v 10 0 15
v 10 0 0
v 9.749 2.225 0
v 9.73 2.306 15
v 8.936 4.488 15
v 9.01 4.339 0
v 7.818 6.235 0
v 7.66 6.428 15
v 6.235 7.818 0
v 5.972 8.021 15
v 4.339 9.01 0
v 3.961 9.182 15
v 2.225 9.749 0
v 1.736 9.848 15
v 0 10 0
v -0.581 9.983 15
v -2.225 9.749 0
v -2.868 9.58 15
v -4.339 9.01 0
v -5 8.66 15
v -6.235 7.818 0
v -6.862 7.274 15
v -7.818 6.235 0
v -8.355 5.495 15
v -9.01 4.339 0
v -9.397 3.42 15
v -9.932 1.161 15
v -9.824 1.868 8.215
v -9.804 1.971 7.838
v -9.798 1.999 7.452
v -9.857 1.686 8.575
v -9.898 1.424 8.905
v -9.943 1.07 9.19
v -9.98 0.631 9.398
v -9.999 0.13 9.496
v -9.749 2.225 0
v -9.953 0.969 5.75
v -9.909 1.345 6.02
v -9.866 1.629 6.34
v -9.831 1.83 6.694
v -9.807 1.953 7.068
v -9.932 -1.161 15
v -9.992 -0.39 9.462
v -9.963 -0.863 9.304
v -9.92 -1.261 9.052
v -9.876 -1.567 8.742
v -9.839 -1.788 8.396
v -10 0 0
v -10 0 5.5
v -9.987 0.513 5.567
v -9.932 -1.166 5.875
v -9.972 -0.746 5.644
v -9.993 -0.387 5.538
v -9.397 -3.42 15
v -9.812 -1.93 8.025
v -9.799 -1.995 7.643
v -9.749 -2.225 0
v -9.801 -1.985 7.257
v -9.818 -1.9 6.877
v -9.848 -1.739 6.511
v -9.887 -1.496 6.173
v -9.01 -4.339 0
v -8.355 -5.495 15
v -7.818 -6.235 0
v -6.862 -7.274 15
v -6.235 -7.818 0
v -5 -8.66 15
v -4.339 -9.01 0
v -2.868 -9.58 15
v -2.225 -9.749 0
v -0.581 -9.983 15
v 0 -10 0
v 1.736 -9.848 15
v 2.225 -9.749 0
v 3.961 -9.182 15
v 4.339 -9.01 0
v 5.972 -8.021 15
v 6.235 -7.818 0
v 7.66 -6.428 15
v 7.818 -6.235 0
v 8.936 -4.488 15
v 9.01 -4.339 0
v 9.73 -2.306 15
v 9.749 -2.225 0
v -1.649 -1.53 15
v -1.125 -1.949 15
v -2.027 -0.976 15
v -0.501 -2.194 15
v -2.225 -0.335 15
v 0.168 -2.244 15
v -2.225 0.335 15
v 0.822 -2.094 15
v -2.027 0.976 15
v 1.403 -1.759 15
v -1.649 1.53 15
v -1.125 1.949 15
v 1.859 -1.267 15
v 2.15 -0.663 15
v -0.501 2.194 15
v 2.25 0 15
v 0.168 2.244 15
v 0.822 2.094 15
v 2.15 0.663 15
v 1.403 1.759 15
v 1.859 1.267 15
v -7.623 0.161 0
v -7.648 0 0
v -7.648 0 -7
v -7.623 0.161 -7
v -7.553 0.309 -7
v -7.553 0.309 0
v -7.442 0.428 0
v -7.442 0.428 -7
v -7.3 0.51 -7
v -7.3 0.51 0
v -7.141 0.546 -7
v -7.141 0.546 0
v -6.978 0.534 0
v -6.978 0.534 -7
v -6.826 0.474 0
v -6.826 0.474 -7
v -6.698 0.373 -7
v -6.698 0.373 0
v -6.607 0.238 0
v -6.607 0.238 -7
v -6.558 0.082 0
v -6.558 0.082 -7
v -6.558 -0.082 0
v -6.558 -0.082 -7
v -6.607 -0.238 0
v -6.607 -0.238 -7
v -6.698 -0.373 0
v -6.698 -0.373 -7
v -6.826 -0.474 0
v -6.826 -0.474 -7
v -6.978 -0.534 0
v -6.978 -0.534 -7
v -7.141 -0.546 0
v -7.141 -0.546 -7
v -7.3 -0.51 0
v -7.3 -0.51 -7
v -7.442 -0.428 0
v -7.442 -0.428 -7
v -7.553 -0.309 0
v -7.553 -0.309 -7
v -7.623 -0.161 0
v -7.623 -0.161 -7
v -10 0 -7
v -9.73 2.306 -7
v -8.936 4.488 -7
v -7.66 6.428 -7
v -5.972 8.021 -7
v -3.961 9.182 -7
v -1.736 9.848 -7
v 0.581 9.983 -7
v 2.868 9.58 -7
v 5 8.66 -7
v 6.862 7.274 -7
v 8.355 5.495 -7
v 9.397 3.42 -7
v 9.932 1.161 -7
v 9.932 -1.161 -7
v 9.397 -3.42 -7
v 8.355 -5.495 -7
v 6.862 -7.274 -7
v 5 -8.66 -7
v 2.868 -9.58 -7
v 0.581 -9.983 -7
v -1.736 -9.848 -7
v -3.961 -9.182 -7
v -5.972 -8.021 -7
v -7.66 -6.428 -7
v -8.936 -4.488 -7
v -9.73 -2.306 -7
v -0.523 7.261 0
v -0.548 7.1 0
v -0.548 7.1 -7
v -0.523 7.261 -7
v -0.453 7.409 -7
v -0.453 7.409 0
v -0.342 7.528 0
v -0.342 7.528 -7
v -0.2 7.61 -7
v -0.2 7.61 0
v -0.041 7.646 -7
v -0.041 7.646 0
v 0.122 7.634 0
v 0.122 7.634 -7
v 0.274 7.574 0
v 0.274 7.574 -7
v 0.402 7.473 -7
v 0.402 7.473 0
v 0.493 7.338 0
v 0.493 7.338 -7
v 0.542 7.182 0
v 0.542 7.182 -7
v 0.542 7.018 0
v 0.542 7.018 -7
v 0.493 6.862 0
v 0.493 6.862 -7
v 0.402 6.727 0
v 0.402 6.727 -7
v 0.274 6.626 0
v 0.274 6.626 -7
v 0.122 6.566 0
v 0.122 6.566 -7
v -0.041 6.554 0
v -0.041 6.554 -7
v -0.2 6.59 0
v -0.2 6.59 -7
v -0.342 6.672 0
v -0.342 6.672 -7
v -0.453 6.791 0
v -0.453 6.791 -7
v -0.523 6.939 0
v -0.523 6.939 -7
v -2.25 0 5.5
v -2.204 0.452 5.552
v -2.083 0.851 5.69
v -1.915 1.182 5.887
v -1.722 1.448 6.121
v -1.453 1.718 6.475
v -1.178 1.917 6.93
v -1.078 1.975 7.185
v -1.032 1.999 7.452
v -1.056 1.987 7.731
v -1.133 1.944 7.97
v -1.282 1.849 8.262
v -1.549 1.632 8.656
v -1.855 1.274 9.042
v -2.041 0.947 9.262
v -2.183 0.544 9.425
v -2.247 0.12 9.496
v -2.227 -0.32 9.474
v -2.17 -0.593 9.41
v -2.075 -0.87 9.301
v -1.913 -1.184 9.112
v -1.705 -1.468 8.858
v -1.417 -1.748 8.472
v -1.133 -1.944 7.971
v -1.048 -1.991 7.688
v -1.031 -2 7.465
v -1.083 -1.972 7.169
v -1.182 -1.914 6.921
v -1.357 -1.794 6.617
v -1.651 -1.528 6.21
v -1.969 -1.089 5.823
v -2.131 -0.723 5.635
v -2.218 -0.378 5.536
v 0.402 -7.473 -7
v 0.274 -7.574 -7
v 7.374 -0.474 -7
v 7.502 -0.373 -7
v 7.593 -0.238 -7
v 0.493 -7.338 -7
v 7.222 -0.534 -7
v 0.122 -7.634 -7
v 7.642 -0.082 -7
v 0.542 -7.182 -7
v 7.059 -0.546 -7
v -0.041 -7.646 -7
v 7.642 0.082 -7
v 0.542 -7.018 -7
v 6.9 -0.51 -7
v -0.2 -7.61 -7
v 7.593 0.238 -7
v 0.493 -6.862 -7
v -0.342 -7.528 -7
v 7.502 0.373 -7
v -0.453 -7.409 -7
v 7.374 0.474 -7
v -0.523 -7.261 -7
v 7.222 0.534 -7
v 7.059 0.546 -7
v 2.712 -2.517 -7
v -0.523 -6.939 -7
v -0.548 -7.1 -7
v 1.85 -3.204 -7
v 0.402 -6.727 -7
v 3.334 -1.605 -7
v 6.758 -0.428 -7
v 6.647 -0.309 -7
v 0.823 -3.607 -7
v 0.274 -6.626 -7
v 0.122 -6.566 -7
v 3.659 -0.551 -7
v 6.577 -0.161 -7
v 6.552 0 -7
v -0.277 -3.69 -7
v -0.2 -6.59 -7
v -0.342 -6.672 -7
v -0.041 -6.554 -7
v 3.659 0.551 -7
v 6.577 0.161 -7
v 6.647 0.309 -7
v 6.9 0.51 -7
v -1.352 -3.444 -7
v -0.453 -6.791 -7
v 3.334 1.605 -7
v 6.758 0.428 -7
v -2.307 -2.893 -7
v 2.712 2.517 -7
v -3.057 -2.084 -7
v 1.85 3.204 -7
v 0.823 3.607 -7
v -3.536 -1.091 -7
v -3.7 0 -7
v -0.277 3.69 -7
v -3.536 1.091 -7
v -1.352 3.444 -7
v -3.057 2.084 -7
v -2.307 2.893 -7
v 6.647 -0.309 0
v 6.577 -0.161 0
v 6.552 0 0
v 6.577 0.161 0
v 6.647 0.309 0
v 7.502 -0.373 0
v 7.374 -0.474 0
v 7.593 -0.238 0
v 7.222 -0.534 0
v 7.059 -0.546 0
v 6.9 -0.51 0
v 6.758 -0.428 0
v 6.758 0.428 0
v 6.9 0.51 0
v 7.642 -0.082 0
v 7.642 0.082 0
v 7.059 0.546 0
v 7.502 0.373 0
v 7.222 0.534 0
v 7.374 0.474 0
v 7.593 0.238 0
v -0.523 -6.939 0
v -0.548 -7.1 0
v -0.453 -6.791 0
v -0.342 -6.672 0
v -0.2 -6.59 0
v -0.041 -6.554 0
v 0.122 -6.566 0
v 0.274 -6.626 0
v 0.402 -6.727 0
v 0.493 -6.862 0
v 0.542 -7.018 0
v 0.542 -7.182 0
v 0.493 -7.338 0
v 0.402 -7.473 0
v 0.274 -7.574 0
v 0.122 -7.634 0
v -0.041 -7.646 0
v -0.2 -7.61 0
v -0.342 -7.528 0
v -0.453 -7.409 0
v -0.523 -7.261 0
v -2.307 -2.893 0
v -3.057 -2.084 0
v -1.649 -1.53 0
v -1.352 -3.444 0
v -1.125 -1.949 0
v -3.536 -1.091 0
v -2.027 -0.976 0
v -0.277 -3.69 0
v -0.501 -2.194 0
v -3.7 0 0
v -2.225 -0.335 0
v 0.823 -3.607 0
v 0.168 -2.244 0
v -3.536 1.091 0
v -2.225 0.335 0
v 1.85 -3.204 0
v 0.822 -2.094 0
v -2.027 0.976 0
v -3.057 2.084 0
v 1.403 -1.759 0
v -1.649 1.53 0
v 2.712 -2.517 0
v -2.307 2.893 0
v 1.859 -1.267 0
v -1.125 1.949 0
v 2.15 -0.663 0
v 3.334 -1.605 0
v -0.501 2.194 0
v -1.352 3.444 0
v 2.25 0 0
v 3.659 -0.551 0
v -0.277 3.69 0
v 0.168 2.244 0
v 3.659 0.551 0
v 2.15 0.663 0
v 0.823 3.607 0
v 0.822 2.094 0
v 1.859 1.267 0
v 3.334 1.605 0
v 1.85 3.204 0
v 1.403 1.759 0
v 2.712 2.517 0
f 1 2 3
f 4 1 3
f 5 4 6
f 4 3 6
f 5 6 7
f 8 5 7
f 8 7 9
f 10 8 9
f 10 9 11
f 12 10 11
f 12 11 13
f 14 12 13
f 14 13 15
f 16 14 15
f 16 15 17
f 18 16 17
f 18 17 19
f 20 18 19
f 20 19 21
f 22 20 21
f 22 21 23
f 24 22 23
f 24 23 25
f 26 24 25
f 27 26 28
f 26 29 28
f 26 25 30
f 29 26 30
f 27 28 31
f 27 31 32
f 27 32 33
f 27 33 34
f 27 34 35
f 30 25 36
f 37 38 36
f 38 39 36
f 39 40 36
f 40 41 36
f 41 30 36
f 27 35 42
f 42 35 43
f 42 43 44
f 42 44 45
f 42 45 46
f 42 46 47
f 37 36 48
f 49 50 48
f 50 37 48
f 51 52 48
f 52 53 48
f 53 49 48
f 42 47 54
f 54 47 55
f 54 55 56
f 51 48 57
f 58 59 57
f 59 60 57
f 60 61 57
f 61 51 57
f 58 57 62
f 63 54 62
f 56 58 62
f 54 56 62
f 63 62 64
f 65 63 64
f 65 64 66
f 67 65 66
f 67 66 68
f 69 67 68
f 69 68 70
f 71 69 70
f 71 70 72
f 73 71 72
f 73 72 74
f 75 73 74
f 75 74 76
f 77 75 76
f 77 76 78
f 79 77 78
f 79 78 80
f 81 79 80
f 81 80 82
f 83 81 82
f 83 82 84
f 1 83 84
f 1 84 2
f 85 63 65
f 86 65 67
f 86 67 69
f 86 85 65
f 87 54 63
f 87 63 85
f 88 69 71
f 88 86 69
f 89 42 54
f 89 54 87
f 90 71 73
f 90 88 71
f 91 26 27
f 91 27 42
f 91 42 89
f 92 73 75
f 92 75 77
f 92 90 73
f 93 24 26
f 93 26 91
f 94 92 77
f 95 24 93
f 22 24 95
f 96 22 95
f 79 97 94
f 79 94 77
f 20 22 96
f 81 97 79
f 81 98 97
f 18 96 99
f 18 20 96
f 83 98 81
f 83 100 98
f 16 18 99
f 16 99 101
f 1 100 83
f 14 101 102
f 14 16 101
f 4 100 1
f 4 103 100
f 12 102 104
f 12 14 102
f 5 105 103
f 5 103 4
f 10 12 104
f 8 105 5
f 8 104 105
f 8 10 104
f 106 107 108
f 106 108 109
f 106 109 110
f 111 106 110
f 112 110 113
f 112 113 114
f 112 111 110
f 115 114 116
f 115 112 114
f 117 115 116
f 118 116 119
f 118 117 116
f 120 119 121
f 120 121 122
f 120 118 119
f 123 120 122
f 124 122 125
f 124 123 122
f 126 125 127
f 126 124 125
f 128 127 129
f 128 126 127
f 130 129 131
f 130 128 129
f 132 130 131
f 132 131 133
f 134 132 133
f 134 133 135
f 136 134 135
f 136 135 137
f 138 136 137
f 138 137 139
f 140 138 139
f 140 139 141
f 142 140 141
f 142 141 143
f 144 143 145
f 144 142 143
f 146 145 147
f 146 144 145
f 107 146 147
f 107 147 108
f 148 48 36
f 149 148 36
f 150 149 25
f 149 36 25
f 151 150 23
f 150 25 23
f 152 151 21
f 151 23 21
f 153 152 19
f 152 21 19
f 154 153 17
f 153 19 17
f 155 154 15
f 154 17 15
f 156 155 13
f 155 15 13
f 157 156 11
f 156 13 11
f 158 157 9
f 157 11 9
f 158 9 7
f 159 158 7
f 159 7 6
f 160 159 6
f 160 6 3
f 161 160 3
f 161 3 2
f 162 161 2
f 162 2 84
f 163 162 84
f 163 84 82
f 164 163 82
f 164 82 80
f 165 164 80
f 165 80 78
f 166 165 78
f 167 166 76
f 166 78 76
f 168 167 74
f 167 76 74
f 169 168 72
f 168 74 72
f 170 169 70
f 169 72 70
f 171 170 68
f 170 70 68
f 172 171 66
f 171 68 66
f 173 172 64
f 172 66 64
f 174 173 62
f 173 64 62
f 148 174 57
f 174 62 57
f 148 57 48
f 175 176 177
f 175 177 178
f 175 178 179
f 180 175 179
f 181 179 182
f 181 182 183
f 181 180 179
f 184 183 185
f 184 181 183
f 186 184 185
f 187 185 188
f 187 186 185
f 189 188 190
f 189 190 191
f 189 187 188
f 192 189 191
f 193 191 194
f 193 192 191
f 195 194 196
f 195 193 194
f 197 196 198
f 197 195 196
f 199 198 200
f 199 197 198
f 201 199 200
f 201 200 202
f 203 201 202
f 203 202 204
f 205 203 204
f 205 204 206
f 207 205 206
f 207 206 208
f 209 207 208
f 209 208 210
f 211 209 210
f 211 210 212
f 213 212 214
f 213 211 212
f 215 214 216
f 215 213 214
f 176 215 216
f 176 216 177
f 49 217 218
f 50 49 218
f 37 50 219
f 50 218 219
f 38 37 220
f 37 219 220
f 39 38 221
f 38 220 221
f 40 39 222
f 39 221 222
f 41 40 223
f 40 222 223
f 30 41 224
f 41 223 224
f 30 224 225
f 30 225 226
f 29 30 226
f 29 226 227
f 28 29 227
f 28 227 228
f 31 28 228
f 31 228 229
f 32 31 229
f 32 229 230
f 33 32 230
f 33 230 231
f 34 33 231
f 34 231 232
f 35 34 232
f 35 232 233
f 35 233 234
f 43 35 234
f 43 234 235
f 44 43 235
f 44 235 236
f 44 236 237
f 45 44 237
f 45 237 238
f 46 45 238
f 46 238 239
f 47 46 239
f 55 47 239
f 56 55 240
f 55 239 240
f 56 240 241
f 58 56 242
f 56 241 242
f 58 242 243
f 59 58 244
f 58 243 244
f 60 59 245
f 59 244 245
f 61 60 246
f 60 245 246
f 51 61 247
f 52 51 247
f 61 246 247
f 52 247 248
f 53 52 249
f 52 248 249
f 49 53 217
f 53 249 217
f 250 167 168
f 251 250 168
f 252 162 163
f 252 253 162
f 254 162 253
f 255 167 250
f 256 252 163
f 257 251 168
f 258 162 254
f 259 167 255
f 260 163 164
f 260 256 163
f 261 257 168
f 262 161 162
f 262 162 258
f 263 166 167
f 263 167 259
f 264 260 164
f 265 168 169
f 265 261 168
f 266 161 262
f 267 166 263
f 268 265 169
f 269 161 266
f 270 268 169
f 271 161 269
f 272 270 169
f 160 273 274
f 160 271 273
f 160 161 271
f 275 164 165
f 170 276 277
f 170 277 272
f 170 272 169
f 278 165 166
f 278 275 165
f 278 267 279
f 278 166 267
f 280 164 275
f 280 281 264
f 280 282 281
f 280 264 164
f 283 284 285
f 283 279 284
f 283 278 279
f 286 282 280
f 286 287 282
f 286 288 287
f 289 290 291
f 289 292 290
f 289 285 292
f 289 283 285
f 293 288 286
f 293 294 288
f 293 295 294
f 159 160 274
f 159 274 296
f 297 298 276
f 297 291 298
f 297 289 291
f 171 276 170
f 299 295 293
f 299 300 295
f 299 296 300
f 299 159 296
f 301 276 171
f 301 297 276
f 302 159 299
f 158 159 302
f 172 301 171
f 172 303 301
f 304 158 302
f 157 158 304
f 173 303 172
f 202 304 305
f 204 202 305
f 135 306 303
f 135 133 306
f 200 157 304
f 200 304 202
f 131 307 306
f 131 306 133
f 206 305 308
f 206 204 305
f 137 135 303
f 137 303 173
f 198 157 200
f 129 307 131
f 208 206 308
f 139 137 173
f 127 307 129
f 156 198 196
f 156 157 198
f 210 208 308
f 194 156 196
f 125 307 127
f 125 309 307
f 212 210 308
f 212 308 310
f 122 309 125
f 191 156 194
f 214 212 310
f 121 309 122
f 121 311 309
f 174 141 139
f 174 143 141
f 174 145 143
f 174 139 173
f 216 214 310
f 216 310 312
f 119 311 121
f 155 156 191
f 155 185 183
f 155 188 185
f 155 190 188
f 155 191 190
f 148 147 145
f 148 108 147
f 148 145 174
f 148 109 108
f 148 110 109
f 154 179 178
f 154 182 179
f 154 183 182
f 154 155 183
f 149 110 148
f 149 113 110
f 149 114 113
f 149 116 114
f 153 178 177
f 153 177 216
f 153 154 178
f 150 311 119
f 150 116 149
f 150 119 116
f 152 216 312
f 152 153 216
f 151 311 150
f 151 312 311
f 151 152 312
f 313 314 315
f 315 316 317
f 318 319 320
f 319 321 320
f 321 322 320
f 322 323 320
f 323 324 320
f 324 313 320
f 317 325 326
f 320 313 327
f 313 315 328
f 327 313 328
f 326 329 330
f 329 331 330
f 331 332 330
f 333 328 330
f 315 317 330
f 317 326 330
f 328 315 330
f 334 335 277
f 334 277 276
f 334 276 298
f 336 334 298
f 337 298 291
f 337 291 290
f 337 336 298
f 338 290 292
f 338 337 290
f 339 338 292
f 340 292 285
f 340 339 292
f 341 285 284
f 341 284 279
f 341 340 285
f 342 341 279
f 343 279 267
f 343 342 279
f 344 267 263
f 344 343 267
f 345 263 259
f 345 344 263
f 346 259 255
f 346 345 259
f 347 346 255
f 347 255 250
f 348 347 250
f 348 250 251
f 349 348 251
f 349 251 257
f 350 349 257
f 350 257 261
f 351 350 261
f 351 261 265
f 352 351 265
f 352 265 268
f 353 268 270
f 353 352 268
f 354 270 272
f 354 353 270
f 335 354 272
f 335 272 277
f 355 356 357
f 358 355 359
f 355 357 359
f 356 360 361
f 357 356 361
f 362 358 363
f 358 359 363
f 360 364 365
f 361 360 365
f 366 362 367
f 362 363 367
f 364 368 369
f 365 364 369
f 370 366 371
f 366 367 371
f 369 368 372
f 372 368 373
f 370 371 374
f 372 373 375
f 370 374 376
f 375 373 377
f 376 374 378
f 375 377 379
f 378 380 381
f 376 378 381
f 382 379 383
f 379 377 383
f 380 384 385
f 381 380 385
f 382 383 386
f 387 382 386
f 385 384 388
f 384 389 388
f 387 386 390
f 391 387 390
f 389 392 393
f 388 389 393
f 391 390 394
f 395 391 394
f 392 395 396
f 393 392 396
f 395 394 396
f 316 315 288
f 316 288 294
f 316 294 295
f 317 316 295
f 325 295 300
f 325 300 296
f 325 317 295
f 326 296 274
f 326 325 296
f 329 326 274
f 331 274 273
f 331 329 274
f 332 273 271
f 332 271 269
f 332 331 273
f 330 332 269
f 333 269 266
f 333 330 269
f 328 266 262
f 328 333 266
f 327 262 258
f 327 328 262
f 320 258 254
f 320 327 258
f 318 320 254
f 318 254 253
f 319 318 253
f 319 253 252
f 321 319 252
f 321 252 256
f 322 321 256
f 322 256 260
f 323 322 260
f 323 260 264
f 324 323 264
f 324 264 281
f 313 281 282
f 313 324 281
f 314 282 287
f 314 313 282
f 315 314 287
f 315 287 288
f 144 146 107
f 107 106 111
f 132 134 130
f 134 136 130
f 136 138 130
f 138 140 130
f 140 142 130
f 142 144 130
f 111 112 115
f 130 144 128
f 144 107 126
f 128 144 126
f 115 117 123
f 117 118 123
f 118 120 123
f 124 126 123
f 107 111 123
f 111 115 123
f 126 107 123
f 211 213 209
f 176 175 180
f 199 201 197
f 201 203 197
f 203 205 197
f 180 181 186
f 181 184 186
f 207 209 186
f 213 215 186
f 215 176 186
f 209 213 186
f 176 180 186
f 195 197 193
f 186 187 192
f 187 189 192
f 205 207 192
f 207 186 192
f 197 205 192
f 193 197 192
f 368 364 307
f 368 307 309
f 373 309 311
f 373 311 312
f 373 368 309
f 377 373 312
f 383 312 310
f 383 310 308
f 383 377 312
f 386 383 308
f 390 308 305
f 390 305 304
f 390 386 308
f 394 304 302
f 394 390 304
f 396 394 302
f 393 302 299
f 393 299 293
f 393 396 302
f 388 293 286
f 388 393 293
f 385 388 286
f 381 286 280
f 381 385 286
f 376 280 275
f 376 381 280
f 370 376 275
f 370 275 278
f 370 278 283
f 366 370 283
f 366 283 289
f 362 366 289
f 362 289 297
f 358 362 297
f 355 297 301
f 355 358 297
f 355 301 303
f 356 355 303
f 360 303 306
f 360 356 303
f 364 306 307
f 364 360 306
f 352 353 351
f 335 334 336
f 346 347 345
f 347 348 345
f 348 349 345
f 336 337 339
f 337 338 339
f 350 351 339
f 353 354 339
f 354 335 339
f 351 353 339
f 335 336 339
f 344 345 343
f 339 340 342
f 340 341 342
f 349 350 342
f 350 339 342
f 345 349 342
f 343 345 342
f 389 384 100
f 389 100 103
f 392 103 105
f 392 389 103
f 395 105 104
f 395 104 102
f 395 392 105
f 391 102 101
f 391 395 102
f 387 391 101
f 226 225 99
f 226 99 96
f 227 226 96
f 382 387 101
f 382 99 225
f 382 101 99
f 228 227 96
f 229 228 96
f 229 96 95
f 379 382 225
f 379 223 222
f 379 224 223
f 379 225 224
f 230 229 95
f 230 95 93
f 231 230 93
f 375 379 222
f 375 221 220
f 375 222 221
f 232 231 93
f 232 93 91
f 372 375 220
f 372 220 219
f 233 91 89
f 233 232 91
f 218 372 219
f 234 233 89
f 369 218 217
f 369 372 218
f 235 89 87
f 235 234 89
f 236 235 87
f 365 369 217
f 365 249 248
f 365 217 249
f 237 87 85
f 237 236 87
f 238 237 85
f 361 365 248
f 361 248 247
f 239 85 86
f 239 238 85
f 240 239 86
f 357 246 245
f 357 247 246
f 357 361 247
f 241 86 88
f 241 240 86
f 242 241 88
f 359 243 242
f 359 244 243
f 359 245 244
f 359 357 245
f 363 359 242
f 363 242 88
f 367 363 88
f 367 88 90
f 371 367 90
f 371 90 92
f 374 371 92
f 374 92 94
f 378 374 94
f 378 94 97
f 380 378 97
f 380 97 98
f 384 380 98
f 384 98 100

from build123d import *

# Parameters (mm, degrees)
ESBO_O1_R                = 10
ESBO_O1_R_2              = 2.25
RESSALTO_EXTRUS_O1_DEPTH = 15
ESBO_O2_R                = 2
CORTE_EXTRUS_O1_DEPTH    = 10
ESBO_O3_R                = 10
ESBO_O3_R_2              = 0.547725274
ESBO_O3_R_3              = 3.7
RESSALTO_EXTRUS_O2_DEPTH = 7


with BuildPart() as part:
    # Esboço1 → Ressalto-extrusão1 (new body)
    with BuildSketch(Plane.XY):
        Circle(ESBO_O1_R)
        Circle(ESBO_O1_R_2, mode=Mode.SUBTRACT)
    extrude(amount=RESSALTO_EXTRUS_O1_DEPTH)

    # Esboço2 → Corte-extrusão1 (cut)
    with BuildSketch(Plane(origin=(0, 0, 0), x_dir=(0, 0, -1), z_dir=(1, 0, 0))):
        with Locations((-7.5, 0)):
            Circle(ESBO_O2_R)
    extrude(amount=-CORTE_EXTRUS_O1_DEPTH, mode=Mode.SUBTRACT)

    # Esboço3 → Ressalto-extrusão2 (add)
    with BuildSketch(Plane(origin=(0, 0, 0), x_dir=(-1, 0, 0), z_dir=(0, 0, -1))):
        Circle(ESBO_O3_R)
        with Locations((0, 7.1)):
            Circle(ESBO_O3_R_2, mode=Mode.SUBTRACT)
        with Locations((7.1, 0)):
            Circle(ESBO_O3_R_2, mode=Mode.SUBTRACT)
        with Locations((0, -7.1)):
            Circle(ESBO_O3_R_2, mode=Mode.SUBTRACT)
        with Locations((-7.1, 0)):
            Circle(ESBO_O3_R_2, mode=Mode.SUBTRACT)
        Circle(ESBO_O3_R_3, mode=Mode.SUBTRACT)
    extrude(amount=RESSALTO_EXTRUS_O2_DEPTH)


solid = part.part
